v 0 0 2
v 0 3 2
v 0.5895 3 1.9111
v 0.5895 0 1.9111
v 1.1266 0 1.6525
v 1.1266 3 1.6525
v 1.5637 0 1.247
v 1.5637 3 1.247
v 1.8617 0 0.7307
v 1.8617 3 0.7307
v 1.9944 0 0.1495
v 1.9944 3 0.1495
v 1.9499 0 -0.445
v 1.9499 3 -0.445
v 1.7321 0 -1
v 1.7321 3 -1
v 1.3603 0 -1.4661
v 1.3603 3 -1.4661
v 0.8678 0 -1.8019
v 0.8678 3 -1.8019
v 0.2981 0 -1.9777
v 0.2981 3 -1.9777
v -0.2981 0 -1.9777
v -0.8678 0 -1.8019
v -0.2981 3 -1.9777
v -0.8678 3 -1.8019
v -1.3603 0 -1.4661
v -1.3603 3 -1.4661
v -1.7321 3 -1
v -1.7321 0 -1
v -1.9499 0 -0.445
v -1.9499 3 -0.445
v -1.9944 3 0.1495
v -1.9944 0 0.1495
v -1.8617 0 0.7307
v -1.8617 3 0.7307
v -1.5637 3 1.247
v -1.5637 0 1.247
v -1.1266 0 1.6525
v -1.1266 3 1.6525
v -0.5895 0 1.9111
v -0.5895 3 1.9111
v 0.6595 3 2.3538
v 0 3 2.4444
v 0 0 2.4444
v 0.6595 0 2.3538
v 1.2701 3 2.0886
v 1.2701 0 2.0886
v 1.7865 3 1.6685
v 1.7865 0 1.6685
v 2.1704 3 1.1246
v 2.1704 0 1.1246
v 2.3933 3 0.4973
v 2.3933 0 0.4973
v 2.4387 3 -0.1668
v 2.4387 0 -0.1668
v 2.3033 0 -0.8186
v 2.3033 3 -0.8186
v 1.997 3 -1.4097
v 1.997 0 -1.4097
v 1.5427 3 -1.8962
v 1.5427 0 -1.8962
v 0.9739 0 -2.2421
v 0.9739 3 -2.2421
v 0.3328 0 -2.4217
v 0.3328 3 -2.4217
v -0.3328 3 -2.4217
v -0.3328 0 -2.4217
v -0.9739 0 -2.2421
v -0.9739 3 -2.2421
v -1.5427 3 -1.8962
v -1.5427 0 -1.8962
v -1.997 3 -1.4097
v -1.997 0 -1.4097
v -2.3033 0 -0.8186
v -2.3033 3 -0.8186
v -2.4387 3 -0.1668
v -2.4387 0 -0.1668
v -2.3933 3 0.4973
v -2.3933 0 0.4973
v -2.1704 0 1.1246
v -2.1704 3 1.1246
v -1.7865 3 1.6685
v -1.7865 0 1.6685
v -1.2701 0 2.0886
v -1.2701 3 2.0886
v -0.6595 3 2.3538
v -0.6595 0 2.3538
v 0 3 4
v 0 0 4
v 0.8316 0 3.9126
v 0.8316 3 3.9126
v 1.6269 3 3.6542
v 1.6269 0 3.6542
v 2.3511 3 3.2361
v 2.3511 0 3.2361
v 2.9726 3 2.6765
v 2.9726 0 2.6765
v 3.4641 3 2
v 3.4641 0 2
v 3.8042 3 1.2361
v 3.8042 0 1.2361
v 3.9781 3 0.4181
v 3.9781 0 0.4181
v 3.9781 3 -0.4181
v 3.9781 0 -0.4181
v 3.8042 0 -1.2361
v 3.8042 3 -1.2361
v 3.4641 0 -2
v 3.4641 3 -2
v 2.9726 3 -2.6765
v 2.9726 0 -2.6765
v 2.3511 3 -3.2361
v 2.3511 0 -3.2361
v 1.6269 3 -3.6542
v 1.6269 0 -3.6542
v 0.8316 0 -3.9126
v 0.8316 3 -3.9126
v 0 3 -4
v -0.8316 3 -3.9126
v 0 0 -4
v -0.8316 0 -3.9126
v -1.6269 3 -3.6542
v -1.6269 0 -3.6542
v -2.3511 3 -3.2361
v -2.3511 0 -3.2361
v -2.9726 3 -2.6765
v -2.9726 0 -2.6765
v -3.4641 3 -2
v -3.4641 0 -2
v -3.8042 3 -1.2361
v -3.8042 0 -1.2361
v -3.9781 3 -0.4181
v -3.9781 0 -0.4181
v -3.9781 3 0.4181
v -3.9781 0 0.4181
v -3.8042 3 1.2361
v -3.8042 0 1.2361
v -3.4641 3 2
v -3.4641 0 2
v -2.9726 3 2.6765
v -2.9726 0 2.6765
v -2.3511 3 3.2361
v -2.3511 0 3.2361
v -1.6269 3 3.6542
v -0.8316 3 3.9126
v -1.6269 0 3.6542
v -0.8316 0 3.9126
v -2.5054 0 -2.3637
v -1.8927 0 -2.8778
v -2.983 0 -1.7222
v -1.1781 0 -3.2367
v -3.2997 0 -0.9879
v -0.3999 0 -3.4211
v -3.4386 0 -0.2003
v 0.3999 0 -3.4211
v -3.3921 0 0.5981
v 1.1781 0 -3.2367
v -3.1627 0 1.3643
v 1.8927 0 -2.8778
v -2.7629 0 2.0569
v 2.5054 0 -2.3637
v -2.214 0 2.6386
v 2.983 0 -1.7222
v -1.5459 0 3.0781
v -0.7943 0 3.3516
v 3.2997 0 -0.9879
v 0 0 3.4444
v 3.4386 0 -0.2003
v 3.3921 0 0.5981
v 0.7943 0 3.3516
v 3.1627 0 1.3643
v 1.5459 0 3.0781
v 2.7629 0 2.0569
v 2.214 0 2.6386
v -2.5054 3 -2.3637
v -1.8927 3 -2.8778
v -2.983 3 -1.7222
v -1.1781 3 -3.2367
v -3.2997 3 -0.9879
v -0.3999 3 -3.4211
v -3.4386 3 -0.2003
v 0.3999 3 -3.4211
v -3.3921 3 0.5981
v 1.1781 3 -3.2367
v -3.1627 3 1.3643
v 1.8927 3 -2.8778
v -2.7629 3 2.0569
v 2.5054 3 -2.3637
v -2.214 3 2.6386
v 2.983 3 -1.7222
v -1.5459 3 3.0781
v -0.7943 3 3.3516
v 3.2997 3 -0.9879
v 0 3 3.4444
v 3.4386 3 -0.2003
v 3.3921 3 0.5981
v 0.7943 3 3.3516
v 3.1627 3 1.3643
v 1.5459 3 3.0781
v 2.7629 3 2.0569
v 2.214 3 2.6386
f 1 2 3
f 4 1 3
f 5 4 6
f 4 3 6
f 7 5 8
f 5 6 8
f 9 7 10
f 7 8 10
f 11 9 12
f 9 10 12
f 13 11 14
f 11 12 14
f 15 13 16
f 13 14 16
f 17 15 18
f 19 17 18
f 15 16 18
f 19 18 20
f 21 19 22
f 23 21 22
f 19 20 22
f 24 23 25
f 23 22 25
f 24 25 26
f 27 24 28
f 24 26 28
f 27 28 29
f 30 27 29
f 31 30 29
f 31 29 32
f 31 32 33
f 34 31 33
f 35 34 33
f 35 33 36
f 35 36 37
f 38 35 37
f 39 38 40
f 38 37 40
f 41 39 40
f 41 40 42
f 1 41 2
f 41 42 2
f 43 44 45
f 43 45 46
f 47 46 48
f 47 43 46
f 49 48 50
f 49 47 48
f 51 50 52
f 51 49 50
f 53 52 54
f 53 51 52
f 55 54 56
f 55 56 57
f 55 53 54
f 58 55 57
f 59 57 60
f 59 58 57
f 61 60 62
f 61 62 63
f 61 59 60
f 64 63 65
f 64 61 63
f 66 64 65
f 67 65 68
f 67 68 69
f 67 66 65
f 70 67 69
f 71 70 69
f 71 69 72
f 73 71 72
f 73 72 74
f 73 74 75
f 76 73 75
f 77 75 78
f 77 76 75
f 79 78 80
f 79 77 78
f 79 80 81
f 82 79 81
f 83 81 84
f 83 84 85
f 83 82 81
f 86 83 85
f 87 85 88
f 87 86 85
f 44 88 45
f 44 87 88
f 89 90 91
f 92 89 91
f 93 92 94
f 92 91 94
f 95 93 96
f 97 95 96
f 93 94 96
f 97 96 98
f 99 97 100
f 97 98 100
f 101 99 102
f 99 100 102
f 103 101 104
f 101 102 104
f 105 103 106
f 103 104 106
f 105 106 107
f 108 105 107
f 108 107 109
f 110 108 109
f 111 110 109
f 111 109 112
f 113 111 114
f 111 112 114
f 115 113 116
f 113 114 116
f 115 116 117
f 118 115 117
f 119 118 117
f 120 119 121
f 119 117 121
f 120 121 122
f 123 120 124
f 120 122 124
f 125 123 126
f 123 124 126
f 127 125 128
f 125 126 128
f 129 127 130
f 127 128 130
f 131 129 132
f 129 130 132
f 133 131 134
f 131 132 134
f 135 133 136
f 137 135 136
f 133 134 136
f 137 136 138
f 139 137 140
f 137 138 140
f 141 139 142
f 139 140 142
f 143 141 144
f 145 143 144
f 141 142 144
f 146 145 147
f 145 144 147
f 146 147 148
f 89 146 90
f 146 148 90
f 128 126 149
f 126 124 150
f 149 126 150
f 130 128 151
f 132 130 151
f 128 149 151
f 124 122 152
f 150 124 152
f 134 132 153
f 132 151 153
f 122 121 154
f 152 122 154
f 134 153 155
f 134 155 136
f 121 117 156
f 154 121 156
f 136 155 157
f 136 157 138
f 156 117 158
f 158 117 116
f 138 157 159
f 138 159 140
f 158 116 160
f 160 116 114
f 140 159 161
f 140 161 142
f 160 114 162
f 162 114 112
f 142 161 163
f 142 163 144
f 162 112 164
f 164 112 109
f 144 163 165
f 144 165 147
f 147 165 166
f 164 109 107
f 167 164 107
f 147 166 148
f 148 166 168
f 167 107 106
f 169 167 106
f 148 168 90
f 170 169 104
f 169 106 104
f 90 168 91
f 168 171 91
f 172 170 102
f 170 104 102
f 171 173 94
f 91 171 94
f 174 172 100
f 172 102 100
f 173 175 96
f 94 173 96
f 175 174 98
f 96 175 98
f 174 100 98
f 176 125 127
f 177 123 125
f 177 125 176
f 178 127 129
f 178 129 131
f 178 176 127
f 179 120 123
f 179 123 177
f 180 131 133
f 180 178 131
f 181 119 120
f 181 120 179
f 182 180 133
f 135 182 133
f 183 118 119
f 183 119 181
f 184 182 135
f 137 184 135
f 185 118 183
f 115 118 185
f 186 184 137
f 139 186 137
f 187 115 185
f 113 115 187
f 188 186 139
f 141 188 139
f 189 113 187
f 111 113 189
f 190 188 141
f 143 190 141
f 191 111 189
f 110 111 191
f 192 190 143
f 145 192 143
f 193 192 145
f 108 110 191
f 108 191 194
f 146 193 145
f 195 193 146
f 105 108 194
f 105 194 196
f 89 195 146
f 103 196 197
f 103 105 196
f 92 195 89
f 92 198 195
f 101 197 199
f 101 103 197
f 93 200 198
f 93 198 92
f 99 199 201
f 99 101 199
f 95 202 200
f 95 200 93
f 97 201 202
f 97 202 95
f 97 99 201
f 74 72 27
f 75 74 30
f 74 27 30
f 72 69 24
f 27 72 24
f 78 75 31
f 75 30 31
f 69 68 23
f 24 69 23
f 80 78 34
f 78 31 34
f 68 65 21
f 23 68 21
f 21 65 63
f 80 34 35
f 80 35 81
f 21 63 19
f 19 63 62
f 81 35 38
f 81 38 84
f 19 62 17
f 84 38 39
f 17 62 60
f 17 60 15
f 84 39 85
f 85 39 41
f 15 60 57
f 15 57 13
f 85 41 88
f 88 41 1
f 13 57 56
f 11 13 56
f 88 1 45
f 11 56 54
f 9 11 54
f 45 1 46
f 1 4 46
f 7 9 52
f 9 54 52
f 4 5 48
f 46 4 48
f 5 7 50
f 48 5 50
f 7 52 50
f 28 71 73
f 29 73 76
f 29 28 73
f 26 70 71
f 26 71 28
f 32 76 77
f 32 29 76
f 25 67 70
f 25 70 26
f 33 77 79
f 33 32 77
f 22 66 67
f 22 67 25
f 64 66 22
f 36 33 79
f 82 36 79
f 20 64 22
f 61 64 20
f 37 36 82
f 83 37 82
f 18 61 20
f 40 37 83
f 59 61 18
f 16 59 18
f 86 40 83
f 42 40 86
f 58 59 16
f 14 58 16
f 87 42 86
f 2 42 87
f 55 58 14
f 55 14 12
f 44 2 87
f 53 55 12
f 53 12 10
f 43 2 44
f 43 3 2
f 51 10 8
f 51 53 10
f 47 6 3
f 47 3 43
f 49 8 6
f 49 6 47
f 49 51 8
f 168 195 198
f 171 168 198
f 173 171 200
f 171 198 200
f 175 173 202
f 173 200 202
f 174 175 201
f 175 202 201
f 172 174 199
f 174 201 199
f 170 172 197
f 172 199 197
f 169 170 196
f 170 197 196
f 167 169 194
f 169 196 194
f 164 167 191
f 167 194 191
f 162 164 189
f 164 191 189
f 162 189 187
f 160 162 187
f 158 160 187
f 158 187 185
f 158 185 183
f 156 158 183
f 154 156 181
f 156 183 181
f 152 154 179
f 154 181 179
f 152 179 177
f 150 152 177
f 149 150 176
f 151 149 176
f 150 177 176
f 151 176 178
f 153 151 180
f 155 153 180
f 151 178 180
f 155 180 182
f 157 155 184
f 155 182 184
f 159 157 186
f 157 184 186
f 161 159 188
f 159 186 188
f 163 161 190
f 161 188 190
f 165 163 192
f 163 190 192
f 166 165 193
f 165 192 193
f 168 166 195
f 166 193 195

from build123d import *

# Parameters (mm, degrees)
SKETCH1_R           = 4
BOSS_EXTRUDE2_DEPTH = 3
SKETCH3_R           = 2
CUT_EXTRUDE2_DEPTH  = 3
SKETCH4_R           = 3.44443066
SKETCH4_R_2         = 2.44443066
CUT_EXTRUDE3_DEPTH  = 3


with BuildPart() as part:
    # Sketch1 → Boss-Extrude2 (new body)
    with BuildSketch(Plane(origin=(0, 0, 0), x_dir=(1, 0, 0), z_dir=(0, 1, 0))):
        with Locations(Location((0, 0, 0), (0, 0, 270))):
            Circle(SKETCH1_R)
    extrude(amount=BOSS_EXTRUDE2_DEPTH)

    # Sketch3 → Cut-Extrude2 (cut)
    with BuildSketch(Plane(origin=(0, 3, 0), x_dir=(1, 0, 0), z_dir=(0, 1, 0))):
        with Locations(Location((0, 0, 0), (0, 0, 270))):
            Circle(SKETCH3_R)
    extrude(amount=-CUT_EXTRUDE2_DEPTH, mode=Mode.SUBTRACT)

    # Sketch4 → Cut-Extrude3 (cut)
    with BuildSketch(Plane(origin=(0, 3, 0), x_dir=(1, 0, 0), z_dir=(0, 1, 0))):
        with Locations(Location((0, 0, 0), (0, 0, 270))):
            Circle(SKETCH4_R)
        with Locations(Location((0, 0, 0), (0, 0, 270))):
            Circle(SKETCH4_R_2, mode=Mode.SUBTRACT)
    extrude(amount=-CUT_EXTRUDE3_DEPTH, mode=Mode.SUBTRACT)


with BuildPart() as cut_extrude3_piece_1:
    # of the separate pieces the step leaves, piece 1, a body of its own (cut_extrude3_pieces)
    add(part.part.solids().sort_by_distance((0, 0, 4))[0])


with BuildPart() as cut_extrude3_piece_2:
    # of the separate pieces the step leaves, piece 2, a body of its own (cut_extrude3_pieces)
    add(part.part.solids().sort_by_distance((0, 0, 2.44443066))[0])


solid = Compound([cut_extrude3_piece_1.part, cut_extrude3_piece_2.part])
